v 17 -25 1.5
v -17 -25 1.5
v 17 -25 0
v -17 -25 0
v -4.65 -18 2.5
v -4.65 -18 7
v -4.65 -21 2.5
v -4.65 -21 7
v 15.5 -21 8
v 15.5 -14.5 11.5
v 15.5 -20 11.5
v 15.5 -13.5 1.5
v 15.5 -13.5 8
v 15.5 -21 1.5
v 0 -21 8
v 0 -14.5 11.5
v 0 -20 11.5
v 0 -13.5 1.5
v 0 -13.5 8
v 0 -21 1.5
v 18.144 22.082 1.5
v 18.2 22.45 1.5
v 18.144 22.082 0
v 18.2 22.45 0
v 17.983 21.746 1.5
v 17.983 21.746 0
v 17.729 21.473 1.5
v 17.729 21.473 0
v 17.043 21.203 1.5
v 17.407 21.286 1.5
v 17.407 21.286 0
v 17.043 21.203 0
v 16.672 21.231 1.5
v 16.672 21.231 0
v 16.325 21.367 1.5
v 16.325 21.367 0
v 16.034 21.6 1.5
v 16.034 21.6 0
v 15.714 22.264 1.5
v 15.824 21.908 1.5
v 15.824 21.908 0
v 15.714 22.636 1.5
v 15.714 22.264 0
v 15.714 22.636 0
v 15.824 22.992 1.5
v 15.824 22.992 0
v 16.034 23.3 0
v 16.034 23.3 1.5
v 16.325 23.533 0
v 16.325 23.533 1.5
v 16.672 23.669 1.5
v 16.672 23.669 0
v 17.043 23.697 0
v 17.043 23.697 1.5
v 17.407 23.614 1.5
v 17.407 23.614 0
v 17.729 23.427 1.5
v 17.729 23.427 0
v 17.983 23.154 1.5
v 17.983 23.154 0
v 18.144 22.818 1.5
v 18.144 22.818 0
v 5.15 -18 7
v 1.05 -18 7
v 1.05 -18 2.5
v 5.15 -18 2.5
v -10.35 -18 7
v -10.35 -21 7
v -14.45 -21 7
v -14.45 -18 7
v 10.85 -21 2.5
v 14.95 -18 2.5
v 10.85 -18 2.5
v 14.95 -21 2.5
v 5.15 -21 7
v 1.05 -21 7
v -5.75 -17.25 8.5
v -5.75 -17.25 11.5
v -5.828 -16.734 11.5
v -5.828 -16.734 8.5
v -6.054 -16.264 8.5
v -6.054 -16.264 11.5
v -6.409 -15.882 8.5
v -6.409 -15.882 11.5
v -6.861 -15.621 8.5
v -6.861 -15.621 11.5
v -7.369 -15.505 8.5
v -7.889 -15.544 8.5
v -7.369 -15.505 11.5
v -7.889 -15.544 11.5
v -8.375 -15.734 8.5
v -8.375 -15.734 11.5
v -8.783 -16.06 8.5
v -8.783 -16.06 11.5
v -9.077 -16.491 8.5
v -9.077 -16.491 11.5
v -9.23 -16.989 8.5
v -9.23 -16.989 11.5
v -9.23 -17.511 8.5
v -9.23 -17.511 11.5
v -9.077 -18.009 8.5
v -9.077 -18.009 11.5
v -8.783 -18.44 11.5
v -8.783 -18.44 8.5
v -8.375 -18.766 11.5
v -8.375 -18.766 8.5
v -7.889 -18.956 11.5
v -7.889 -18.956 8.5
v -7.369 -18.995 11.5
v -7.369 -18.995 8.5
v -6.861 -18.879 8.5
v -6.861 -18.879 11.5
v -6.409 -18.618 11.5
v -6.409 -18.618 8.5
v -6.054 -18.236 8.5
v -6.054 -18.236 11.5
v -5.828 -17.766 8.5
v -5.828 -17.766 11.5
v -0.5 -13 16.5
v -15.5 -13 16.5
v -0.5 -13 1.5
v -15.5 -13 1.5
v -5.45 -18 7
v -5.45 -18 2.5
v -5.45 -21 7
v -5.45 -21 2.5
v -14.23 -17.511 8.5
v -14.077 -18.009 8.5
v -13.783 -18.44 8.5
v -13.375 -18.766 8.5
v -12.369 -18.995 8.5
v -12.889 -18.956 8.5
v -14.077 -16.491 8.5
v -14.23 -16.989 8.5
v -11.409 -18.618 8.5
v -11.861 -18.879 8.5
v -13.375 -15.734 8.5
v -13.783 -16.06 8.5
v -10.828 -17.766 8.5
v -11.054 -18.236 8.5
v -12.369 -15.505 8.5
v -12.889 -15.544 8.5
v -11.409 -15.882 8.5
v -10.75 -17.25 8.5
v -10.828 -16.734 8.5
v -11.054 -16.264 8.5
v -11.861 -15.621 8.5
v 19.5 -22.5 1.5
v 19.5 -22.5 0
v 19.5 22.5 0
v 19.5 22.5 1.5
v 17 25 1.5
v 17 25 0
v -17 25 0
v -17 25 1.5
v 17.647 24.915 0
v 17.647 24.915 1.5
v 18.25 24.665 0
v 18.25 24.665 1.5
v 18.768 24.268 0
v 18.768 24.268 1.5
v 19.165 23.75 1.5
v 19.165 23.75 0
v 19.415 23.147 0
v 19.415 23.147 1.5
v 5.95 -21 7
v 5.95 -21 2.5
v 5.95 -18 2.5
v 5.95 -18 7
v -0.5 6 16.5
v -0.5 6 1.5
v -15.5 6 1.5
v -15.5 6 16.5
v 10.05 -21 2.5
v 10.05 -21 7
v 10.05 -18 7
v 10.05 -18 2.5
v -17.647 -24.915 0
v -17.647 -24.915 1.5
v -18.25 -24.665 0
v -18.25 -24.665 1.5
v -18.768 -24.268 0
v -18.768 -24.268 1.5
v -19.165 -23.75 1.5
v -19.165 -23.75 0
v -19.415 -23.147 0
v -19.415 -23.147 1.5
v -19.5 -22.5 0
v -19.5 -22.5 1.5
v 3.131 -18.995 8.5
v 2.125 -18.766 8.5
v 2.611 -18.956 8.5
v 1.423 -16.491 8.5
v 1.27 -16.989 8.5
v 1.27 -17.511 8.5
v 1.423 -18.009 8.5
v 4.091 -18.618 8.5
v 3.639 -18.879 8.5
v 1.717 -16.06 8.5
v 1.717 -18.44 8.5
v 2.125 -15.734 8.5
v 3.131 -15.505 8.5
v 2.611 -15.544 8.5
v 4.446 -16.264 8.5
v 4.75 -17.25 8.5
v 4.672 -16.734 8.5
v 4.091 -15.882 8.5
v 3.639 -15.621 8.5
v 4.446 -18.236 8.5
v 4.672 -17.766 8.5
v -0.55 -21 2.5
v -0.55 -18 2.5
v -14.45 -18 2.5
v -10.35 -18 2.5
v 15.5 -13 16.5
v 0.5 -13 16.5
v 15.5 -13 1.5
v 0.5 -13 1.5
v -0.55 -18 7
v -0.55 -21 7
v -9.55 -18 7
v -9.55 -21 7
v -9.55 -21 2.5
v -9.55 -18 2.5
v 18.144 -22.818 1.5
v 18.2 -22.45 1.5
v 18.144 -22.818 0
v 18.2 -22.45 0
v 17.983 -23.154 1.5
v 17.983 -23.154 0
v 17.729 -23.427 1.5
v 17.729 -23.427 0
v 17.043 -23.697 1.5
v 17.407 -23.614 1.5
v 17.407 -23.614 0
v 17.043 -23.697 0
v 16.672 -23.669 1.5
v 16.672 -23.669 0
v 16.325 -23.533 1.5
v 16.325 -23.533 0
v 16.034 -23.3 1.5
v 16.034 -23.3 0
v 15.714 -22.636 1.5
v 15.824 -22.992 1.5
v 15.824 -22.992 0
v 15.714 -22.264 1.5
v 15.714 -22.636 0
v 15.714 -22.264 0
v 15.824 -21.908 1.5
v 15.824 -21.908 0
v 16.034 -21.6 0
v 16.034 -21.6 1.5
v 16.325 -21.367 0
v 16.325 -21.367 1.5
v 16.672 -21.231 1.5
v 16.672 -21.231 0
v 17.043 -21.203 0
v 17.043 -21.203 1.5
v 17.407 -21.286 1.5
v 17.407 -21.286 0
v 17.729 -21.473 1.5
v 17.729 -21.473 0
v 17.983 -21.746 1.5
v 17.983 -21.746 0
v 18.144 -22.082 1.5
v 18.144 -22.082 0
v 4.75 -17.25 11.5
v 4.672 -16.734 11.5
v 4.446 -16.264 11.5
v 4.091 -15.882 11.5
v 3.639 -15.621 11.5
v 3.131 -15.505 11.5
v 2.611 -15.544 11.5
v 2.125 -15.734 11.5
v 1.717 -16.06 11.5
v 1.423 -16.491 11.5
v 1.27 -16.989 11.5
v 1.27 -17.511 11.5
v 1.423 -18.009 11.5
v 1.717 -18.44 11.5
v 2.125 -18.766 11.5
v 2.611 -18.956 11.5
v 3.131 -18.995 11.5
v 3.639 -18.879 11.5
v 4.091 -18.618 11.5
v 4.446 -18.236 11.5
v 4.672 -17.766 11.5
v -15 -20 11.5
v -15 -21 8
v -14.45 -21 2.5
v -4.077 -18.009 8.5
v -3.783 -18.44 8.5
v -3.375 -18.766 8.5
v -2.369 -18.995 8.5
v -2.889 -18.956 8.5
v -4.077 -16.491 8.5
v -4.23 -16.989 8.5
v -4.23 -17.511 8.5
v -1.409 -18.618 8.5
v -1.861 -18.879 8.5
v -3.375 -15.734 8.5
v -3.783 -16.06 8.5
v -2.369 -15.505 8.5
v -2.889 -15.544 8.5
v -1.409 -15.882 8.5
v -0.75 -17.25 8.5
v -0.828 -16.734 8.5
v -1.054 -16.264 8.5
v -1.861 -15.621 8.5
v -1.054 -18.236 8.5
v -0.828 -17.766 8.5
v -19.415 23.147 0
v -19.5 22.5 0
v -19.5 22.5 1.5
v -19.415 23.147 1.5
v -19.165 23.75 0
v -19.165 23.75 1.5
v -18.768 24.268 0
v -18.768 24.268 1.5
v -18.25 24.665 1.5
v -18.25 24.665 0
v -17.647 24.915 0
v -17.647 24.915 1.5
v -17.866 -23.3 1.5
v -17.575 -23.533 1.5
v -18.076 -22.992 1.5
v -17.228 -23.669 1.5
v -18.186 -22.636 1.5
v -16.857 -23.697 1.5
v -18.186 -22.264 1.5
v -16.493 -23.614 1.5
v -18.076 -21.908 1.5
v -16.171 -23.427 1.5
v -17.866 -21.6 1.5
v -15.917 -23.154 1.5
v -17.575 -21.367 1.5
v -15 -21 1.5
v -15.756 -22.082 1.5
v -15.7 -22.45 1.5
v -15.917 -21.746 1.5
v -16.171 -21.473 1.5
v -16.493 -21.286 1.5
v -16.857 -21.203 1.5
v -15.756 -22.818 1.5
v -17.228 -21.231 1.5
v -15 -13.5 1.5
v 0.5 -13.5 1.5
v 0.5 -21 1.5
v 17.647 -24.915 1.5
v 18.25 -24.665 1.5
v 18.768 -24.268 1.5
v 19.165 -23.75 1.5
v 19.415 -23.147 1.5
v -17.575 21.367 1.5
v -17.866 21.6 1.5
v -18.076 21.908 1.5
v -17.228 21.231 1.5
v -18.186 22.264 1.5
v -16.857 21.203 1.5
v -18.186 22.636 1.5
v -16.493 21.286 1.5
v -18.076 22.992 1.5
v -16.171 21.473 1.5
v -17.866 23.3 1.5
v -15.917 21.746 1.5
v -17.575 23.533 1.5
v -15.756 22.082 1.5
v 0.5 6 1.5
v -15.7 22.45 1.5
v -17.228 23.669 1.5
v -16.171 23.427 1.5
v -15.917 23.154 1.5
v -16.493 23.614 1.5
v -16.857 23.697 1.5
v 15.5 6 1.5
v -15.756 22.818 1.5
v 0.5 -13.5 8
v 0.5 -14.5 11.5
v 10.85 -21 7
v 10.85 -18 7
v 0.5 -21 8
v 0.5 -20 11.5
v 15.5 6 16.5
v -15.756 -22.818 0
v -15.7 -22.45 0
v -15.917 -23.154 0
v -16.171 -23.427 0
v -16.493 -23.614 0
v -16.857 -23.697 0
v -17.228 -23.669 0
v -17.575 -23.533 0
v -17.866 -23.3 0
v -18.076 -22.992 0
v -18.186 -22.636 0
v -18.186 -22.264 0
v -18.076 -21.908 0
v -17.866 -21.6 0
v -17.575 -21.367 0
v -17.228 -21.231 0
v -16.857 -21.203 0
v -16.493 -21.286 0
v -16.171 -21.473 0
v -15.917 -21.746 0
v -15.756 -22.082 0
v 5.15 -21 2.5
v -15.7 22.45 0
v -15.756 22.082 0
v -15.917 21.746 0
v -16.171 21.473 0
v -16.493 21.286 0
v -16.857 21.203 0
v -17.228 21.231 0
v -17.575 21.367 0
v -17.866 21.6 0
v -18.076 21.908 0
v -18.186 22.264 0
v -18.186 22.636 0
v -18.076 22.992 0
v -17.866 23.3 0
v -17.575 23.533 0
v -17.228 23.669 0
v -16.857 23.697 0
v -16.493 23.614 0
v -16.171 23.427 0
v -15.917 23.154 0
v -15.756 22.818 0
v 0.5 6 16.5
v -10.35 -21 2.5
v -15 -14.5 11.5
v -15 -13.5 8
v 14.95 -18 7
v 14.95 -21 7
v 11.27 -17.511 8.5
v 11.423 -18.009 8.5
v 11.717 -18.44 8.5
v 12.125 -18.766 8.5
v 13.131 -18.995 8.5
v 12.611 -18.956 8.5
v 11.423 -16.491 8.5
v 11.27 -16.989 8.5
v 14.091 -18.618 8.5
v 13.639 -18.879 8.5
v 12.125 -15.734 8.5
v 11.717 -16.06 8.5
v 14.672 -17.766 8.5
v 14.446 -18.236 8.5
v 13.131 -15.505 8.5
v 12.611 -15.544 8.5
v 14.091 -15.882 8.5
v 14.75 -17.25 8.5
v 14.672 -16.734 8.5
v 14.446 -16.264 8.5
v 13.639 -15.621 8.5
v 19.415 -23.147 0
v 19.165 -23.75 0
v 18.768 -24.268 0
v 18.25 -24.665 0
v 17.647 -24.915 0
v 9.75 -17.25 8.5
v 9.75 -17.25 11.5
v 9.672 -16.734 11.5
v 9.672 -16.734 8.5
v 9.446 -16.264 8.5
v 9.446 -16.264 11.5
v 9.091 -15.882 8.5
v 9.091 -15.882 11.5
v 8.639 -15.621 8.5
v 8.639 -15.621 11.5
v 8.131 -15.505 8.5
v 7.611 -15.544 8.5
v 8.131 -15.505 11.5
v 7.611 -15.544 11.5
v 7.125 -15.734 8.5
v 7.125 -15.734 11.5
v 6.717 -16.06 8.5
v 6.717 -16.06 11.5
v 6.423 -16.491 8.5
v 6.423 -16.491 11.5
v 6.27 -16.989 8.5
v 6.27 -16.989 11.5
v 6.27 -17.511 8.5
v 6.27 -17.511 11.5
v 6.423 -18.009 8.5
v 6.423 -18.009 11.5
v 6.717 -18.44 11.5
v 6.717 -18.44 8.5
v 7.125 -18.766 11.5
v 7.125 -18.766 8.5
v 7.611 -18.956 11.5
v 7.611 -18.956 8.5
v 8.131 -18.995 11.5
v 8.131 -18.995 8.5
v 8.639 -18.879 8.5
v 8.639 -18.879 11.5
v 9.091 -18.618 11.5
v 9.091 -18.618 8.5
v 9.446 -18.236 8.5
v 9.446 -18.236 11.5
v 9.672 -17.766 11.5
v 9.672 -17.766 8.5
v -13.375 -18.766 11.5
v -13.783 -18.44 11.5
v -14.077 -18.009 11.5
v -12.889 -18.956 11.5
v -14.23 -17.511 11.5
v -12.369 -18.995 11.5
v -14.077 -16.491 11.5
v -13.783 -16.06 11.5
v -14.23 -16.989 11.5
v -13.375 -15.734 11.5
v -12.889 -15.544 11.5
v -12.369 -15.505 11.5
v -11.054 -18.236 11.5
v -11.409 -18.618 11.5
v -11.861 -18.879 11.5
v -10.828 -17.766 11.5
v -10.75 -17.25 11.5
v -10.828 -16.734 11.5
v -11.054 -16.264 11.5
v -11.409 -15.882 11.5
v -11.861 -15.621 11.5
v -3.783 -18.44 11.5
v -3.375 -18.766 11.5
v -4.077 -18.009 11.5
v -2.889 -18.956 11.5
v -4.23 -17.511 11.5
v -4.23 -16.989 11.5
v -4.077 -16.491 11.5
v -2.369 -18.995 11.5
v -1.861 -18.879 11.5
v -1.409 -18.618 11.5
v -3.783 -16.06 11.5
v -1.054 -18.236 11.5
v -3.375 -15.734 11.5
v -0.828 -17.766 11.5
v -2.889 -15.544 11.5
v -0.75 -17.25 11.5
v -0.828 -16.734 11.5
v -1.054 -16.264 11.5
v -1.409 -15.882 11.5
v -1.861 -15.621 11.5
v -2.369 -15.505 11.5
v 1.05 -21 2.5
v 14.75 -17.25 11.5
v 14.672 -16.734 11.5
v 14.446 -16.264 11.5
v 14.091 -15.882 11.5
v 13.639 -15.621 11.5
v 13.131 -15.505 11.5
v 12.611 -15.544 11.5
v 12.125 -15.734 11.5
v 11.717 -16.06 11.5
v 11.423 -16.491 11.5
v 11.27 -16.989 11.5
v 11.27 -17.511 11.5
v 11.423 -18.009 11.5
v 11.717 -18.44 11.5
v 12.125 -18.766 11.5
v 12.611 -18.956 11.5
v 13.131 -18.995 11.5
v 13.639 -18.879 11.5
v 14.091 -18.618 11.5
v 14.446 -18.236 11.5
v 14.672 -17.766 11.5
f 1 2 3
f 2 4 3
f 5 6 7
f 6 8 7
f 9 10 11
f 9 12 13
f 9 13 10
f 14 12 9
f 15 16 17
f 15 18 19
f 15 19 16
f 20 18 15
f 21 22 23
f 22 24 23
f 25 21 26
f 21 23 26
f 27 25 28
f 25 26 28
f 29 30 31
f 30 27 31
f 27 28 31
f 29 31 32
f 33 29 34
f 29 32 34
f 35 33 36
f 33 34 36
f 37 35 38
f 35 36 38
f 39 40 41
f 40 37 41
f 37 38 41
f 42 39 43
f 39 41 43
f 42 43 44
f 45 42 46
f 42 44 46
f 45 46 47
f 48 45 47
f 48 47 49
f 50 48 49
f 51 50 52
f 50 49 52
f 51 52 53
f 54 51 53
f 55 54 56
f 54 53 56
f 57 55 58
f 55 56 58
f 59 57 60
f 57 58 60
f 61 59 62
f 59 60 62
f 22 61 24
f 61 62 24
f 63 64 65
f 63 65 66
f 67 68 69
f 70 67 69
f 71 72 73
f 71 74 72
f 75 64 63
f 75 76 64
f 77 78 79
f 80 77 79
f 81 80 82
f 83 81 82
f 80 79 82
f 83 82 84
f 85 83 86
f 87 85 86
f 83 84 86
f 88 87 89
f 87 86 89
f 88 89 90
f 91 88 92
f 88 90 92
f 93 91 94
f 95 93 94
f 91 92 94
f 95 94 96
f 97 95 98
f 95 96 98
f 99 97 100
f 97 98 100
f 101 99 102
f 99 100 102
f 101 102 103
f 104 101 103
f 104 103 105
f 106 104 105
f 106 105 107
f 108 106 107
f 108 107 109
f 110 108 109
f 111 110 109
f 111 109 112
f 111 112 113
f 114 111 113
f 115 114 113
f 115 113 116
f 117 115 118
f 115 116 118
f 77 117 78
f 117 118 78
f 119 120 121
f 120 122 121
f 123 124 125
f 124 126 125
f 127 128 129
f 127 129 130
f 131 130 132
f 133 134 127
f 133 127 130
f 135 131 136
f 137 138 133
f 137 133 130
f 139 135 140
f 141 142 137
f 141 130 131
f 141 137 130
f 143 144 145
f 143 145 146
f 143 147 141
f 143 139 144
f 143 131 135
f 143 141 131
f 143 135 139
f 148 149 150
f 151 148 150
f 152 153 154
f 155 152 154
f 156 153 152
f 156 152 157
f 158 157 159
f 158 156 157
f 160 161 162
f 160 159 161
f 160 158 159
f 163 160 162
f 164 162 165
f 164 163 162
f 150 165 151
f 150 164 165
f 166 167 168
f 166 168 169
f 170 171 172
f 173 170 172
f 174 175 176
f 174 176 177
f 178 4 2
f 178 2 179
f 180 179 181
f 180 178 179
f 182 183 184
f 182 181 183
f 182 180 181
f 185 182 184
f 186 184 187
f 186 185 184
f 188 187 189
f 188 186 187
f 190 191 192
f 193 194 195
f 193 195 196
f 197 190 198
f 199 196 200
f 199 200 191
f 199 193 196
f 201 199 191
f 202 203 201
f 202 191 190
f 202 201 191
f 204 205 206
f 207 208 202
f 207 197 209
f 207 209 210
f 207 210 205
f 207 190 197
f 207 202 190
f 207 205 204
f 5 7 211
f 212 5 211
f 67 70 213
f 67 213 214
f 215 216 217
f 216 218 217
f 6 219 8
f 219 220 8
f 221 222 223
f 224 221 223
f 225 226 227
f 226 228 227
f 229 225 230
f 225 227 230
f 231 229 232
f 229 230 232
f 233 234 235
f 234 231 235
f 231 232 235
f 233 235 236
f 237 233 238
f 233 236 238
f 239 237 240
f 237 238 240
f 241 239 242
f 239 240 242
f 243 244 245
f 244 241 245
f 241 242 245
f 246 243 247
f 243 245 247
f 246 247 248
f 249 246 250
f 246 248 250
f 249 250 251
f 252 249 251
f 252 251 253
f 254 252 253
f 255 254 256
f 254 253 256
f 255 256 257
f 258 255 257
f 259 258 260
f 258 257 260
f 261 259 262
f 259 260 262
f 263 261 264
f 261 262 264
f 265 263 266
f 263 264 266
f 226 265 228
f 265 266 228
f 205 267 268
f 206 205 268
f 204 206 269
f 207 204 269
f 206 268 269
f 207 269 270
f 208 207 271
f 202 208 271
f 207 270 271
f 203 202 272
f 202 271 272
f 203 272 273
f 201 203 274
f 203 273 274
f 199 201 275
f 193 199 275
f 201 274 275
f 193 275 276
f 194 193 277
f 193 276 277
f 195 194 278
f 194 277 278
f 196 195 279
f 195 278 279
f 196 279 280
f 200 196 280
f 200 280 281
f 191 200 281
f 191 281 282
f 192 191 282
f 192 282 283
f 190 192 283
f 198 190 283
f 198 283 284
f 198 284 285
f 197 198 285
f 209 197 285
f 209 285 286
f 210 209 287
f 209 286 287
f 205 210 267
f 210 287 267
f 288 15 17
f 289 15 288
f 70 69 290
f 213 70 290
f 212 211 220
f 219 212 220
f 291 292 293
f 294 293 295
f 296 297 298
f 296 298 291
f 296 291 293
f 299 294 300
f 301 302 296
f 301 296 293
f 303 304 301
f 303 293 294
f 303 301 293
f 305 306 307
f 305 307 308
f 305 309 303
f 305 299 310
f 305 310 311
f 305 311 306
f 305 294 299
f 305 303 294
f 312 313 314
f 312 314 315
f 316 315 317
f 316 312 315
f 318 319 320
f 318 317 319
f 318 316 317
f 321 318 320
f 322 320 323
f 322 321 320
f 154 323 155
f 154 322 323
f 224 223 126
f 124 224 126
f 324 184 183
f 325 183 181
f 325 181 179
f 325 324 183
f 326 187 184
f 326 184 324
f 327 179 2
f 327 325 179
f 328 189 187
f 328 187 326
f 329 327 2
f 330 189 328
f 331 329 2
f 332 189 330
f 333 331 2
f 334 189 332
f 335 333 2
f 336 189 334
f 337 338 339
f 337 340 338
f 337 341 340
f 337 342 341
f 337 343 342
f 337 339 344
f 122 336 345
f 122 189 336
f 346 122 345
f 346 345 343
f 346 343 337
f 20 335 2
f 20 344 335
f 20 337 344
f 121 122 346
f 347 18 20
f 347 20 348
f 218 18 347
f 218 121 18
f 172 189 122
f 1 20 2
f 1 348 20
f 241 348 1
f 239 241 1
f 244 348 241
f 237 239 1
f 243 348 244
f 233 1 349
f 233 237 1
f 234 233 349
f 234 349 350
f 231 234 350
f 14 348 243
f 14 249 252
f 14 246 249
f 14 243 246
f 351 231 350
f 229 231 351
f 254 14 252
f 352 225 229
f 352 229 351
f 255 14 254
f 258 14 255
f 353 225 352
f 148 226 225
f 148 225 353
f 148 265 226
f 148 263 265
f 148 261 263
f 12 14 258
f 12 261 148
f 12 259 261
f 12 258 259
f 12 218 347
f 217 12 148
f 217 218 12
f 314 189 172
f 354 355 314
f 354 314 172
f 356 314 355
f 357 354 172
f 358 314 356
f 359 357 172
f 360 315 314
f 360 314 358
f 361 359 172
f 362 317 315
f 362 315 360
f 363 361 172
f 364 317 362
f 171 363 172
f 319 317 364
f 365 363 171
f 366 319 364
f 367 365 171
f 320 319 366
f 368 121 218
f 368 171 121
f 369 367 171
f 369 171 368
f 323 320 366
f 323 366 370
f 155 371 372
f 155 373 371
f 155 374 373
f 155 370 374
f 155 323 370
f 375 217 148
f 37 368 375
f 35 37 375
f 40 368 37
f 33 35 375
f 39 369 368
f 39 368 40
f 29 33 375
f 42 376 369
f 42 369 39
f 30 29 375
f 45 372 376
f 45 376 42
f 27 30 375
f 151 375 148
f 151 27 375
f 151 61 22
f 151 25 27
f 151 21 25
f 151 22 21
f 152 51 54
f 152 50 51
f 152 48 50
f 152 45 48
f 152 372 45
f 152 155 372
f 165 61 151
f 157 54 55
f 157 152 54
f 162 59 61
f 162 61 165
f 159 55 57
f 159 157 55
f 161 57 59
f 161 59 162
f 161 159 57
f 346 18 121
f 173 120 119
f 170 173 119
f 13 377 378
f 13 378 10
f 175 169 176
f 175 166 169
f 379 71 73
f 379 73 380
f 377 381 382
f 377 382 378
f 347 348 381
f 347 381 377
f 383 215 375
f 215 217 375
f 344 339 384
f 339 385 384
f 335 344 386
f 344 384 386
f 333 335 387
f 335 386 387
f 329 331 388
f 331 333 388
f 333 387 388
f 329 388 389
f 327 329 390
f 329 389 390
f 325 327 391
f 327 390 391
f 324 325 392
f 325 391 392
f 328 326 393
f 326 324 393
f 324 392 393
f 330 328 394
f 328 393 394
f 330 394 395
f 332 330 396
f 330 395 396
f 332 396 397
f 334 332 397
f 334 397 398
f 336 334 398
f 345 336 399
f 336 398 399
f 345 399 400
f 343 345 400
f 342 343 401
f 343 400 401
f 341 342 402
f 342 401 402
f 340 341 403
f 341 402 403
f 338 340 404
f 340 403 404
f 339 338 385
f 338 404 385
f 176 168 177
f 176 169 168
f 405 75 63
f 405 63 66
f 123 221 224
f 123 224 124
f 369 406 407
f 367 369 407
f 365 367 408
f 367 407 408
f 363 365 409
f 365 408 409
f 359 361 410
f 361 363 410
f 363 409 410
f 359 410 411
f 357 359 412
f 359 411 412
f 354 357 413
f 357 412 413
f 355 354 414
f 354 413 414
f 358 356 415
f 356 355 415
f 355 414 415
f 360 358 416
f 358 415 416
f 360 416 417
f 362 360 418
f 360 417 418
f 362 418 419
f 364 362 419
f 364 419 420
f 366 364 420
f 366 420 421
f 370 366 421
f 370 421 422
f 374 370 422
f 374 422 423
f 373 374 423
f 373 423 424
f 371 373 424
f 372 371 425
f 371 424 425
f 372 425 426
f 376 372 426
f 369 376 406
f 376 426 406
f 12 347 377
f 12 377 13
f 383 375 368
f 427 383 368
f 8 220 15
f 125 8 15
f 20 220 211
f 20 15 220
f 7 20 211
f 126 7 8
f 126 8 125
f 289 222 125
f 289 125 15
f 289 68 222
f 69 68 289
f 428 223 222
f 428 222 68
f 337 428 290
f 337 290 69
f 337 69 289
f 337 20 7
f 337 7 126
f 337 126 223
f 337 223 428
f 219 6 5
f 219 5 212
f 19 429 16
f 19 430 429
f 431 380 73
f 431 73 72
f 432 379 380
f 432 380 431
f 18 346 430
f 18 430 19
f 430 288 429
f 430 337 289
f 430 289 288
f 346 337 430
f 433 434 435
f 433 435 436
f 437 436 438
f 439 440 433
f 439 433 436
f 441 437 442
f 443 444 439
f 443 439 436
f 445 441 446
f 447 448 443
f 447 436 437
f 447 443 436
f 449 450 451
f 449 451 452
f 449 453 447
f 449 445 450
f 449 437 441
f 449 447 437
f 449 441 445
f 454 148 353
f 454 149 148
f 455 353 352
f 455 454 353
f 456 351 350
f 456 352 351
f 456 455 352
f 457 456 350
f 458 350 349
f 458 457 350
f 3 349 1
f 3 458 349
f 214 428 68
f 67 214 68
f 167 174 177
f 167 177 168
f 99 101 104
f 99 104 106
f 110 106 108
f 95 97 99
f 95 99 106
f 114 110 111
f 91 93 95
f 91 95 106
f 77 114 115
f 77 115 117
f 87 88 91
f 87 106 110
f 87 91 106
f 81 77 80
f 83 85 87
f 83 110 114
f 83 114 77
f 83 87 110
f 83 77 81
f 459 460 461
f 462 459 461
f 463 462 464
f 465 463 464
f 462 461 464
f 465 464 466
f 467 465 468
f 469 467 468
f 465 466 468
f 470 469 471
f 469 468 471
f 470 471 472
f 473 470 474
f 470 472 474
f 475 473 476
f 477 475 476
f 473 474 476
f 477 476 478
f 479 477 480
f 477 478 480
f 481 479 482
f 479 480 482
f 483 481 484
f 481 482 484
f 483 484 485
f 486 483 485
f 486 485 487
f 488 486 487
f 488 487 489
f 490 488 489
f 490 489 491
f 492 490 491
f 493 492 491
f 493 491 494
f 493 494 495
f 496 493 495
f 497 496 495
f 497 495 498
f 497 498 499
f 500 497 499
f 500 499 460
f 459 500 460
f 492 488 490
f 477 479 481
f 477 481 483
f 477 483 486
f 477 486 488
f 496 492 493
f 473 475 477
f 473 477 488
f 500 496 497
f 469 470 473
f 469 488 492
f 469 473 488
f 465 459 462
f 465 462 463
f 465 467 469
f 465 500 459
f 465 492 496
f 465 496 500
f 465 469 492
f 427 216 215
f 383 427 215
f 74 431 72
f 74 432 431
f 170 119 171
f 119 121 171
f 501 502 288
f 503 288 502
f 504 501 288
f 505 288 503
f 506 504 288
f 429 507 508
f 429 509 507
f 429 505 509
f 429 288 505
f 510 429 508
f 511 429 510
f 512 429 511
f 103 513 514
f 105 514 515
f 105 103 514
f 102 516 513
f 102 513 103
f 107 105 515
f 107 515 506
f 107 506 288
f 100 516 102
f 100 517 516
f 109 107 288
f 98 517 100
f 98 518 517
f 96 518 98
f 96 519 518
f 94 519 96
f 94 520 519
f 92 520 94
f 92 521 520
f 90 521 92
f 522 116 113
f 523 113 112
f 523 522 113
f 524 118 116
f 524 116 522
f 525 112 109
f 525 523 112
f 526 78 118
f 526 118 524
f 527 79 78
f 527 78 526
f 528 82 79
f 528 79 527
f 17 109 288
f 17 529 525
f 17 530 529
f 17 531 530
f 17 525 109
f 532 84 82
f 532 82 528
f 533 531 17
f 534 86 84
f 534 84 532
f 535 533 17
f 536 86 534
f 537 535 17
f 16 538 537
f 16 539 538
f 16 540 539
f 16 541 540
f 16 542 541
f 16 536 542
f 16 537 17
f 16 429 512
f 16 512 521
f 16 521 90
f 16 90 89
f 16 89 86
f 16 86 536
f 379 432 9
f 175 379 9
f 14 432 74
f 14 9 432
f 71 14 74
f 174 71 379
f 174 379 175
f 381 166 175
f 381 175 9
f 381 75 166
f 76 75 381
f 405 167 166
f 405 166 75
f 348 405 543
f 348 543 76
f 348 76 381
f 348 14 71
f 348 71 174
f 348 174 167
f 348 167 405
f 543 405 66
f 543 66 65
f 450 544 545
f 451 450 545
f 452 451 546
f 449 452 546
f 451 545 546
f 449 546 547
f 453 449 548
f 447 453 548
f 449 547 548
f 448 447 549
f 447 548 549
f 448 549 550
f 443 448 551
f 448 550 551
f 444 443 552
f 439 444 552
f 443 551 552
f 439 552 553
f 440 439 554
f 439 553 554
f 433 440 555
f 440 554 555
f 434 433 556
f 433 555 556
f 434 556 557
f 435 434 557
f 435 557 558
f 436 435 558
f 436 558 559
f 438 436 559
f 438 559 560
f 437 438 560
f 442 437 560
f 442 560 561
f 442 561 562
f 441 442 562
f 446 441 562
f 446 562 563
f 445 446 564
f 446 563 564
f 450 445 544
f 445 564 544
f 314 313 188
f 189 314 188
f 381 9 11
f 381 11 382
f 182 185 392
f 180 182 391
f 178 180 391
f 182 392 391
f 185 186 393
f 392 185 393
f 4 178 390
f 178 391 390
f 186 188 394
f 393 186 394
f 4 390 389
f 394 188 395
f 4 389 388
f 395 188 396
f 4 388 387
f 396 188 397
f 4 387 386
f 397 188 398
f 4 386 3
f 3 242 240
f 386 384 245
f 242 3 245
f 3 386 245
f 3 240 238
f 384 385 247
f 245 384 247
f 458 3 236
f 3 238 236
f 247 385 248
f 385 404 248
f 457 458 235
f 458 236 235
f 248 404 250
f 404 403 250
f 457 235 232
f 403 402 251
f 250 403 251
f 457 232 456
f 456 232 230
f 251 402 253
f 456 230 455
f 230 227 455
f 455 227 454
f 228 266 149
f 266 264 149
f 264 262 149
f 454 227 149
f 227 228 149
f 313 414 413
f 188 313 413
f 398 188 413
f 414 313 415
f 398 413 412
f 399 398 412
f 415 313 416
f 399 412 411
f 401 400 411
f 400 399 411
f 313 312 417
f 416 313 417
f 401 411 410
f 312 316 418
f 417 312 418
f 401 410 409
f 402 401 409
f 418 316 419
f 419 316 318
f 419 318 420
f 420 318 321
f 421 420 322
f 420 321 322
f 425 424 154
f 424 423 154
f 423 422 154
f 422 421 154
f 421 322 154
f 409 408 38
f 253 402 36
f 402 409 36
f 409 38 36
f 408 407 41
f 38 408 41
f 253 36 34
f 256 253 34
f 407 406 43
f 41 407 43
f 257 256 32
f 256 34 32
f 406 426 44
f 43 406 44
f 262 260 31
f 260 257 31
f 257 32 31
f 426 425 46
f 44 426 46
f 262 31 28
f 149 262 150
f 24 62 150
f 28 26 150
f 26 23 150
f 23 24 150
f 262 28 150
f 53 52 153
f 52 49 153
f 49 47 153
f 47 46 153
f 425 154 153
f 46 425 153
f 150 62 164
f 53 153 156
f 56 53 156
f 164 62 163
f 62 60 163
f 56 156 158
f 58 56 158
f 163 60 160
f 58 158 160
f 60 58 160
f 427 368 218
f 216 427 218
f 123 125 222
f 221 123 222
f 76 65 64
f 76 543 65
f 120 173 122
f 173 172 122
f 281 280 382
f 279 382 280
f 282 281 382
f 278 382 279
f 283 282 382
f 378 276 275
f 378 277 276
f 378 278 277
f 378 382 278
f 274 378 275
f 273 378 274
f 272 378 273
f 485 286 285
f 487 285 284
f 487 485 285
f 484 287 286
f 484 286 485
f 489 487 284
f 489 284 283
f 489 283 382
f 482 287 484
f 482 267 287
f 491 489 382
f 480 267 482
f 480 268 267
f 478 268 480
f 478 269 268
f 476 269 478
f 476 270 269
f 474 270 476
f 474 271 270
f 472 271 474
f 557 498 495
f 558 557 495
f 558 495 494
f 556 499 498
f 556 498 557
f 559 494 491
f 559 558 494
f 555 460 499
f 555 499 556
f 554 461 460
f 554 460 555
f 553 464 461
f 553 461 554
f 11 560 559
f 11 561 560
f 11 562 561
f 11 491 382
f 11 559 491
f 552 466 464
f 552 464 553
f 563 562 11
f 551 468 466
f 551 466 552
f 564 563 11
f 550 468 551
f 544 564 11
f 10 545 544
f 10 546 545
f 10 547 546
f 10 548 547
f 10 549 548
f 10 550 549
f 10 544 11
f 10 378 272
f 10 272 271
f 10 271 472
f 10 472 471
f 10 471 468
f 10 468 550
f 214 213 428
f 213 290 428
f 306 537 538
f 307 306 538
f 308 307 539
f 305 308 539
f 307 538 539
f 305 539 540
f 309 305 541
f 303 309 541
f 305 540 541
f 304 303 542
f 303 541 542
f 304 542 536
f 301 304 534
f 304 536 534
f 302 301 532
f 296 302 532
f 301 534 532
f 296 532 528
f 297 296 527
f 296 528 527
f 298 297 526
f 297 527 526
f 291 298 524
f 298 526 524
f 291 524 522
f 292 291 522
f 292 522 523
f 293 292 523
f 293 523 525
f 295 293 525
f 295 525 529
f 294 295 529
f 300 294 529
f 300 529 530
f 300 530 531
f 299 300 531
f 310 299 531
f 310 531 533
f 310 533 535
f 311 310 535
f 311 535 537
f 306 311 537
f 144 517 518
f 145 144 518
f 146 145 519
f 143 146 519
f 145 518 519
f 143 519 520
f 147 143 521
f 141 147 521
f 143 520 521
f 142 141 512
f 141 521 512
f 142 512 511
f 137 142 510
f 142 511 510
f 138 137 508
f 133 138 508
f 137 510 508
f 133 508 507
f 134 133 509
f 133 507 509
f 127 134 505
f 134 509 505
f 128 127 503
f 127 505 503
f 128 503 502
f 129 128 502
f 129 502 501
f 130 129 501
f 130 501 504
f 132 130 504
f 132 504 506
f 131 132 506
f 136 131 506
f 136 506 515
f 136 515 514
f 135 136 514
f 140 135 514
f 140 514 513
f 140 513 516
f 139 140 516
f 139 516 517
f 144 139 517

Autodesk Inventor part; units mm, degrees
ref_plane "YZ Plane" through (0, 0, 0) normal (1, 0, 0) x (0, 1, 0)
ref_plane "XZ Plane" through (0, 0, 0) normal (0, 1, 0) x (-1, 0, 0)
ref_plane "XY Plane" through (0, 0, 0) normal (0, 0, 1) x (1, 0, 0)
sketch "Sketch1" plane through (0, 0, 0) normal (0, 0, 1) x (1, 0, 0)
  line L0 (-17, -25) -> (17, -25)
  line L1 (19.5, -22.5) -> (19.5, 22.5)
  line L2 (17, 25) -> (-17, 25)
  line L3 (-19.5, 22.5) -> (-19.5, -22.5)
  line L4 (19.5, -25) -> (-19.5, 25) construction
  circle A0 centre (16.95, -22.45) radius 1.25
  arc A1 (17, -25) -> (19.5, -22.5) centre (17, -22.5) ccw
  circle A2 centre (-16.95, -22.45) radius 1.25
  circle A3 centre (-16.95, 22.45) radius 1.25
  circle A4 centre (16.95, 22.45) radius 1.25
  arc A5 (19.5, 22.5) -> (17, 25) centre (17, 22.5) ccw
  arc A6 (-17, 25) -> (-19.5, 22.5) centre (-17, 22.5) ccw
  arc A7 (-19.5, -22.5) -> (-17, -25) centre (-17, -22.5) ccw
  point P0 (0, 0)
  point P1 (-19.5, -25)
  point P2 (19.5, 25)
  point P3 (0, 0)
  dimension "d0" = 50
  dimension "d1" = 39
  dimension "d2" = 2.5
  dimension "d3" = 2.55
  dimension "d4" = 2.55
  dimension "d5" = 2.5
  dimension "d6" = 2.5
  dimension "d7" = 2.5
  dimension "d8" = 2.5
  dimension "d9" = 2.55
  dimension "d10" = 2.55
  dimension "d11" = 2.55
  dimension "d12" = 2.55
  dimension "d13" = 2.55
  dimension "d14" = 2.55
  dimension "d15" = 2.5
extrude "Extrusion1" add sketch "Sketch1" along normal blind 1.5
sketch "Sketch2" plane through (0, 0, 1.5) normal (0, 0, 1) x (1, 0, 0)
  line L0 (0.5, -13) -> (15.5, -13)
  line L1 (15.5, -13) -> (15.5, 6)
  line L2 (15.5, 6) -> (0.5, 6)
  line L3 (0.5, 6) -> (0.5, -13)
  line L4 (-15.5, -13) -> (-0.5, -13)
  line L5 (-0.5, -13) -> (-0.5, 6)
  line L6 (-0.5, 6) -> (-15.5, 6)
  line L7 (-15.5, 6) -> (-15.5, -13)
  line L8 (19.5, -22.5) -> (19.5, 22.5) projected
  line L9 (-19.5, 22.5) -> (-19.5, -22.5) projected
  line L10 (-17, -25) -> (17, -25) projected
  point P0 (0, 0)
  dimension "d18" = 15
  dimension "d19" = 19
  dimension "d22" = 16
  dimension "d27" = 4
  dimension "d28" = 39
  dimension "d29" = 12
extrude "Extrusion2" add sketch "Sketch2" along normal blind 15
sketch "Sketch3" plane through (0, 0, 1.5) normal (0, 0, 1) x (1, 0, 0)
  line L0 (0, -21) -> (-15, -21)
  line L1 (-15, -21) -> (-15, -13.5)
  line L2 (-15, -13.5) -> (0, -13.5)
  line L3 (0, -13.5) -> (0, -21)
  line L4 (-15.5, -13) -> (-0.5, -13) projected
  line L5 (-15.5, 6) -> (-15.5, -13) projected
  line L6 (15.5, -21) -> (0.5, -21)
  line L7 (0.5, -21) -> (0.5, -13.5)
  line L8 (0.5, -13.5) -> (15.5, -13.5)
  line L9 (15.5, -13.5) -> (15.5, -21)
  line L10 (0.5, -13) -> (15.5, -13) projected
  point P0 (0, 0)
  dimension "d32" = 15
  dimension "d33" = 7.5
  dimension "d34" = 0.5
  dimension "d35" = 0.5
  dimension "d36" = 15
  dimension "d37" = 7.5
  dimension "d38" = 0.5
  dimension "d39" = 0.5
extrude "Extrusion3" add sketch "Sketch3" along normal blind 10
chamfer "Chamfer1" distance 1 distance2 3.5 1 edges at (8, -21, 11.5) measured on face at (10.5, -18.5, 11.5)
chamfer "Chamfer2" distance 1 distance2 3.5 1 edges at (8, -13.5, 11.5) measured on face at (10.5, -17.8333, 11.5)
chamfer "Chamfer3" distance 1 distance2 3.5 1 edges at (-7.5, -13.5, 11.5) measured on face at (-5, -18.5, 11.5)
chamfer "Chamfer4" distance 1 distance2 3.5 1 edges at (-7.5, -21, 11.5) measured on face at (-5, -18.8333, 11.5)
sketch "Sketch4" plane through (0, 0, 11.5) normal (0, 0, 1) x (1, 0, 0)
  line L0 (0.5, -14.5) -> (0.5, -20) projected
  line L1 (0, -20) -> (0, -14.5) projected
  line L2 (0.25, -35.642) -> (0.25, -29.5385) construction
  circle A0 centre (-12.5, -17.25) radius 1.75
  line L3 (-15, -14.5) -> (-15, -20) projected
  line L4 (-15, -14.5) -> (0, -14.5) projected
  line L5 (0, -20) -> (-15, -20) projected
  circle A1 centre (-7.5, -17.25) radius 1.75
  circle A2 centre (-2.5, -17.25) radius 1.75
  circle A3 centre (13, -17.25) radius 1.75
  circle A4 centre (8, -17.25) radius 1.75
  circle A5 centre (3, -17.25) radius 1.75
  point P0 (0, 0)
  dimension "d54" = 0.5
  dimension "d55" = 0.25
  dimension "d56" = 3.5
  dimension "d57" = 2.5
  dimension "d58" = 5.5
  dimension "d59" = 2.75
  dimension "d62" = 5
extrude "Extrusion4" cut sketch "Sketch4" against normal blind 3 contours A0 | A1 | A2 | A3 | A4 | A5
sketch "Sketch5" plane through (0.5, -21, 1.5) normal (0, -1, 0) x (1, 0, 0)
  line L0 (0.55, 5.5) -> (4.65, 5.5)
  line L1 (4.65, 5.5) -> (4.65, 1)
  line L2 (4.65, 1) -> (0.55, 1)
  line L3 (0.55, 1) -> (0.55, 5.5)
  line L4 (15, 10) -> (0, 10) projected
  line L5 (0, 0) -> (0, 6.5) projected
  line L6 (5.45, 1) -> (5.45, 5.5)
  line L7 (5.45, 5.5) -> (9.55, 5.5)
  line L8 (9.55, 1) -> (5.45, 1)
  line L9 (9.55, 5.5) -> (9.55, 1)
  line L10 (10.35, 1) -> (10.35, 5.5)
  line L11 (10.35, 5.5) -> (14.45, 5.5)
  line L12 (14.45, 1) -> (10.35, 1)
  line L13 (14.45, 5.5) -> (14.45, 1)
  line L14 (15, 0) -> (15, 6.5) projected
  line L15 (-0.5, 0) -> (-0.5, 6.5) projected
  line L16 (-0.25, -5.4551) -> (-0.25, -7.5555) construction
  line L17 (-1.05, 5.5) -> (-5.15, 5.5)
  line L18 (-5.15, 5.5) -> (-5.15, 1)
  line L19 (-5.15, 1) -> (-1.05, 1)
  line L20 (-1.05, 1) -> (-1.05, 5.5)
  line L21 (-5.95, 1) -> (-5.95, 5.5)
  line L22 (-5.95, 5.5) -> (-10.05, 5.5)
  line L23 (-10.05, 1) -> (-5.95, 1)
  line L24 (-10.05, 5.5) -> (-10.05, 1)
  line L25 (-10.85, 1) -> (-10.85, 5.5)
  line L26 (-10.85, 5.5) -> (-14.95, 5.5)
  line L27 (-14.95, 1) -> (-10.85, 1)
  line L28 (-14.95, 5.5) -> (-14.95, 1)
  point P0 (-0.5, -1.5)
  dimension "d71" = 4.1
  dimension "d72" = 4.5
  dimension "d73" = 4.5
  dimension "d74" = 0.55
  dimension "d77" = 4.9
  dimension "d85" = 0.5
  dimension "d86" = 0.25
extrude "Extrusion5" cut sketch "Sketch5" against normal blind 3
equation "\"d4\" = d3"
equation "\"d5\" = d2"
equation "\"d6\" = d2"
equation "\"d7\" = d2"
equation "\"d8\" = d2"
equation "\"d9\" = d3"
equation "\"d10\" = d3"
equation "\"d11\" = d3"
equation "\"d12\" = d3"
equation "\"d13\" = d3"
equation "\"d14\" = d3"
equation "\"d15\" = d2"
equation "\"d27\" = -0.5 * d22 + 0.5 * d28 - 0.5 * d18"
equation "\"d39\" = d34"
equation "\"d55\" = 0.5 * d54"
equation "\"d59\" = 0.5 * d58"
equation "\"d86\" = 0.5 * d85"
properties part number "Dual Relay w Breakout Board"
